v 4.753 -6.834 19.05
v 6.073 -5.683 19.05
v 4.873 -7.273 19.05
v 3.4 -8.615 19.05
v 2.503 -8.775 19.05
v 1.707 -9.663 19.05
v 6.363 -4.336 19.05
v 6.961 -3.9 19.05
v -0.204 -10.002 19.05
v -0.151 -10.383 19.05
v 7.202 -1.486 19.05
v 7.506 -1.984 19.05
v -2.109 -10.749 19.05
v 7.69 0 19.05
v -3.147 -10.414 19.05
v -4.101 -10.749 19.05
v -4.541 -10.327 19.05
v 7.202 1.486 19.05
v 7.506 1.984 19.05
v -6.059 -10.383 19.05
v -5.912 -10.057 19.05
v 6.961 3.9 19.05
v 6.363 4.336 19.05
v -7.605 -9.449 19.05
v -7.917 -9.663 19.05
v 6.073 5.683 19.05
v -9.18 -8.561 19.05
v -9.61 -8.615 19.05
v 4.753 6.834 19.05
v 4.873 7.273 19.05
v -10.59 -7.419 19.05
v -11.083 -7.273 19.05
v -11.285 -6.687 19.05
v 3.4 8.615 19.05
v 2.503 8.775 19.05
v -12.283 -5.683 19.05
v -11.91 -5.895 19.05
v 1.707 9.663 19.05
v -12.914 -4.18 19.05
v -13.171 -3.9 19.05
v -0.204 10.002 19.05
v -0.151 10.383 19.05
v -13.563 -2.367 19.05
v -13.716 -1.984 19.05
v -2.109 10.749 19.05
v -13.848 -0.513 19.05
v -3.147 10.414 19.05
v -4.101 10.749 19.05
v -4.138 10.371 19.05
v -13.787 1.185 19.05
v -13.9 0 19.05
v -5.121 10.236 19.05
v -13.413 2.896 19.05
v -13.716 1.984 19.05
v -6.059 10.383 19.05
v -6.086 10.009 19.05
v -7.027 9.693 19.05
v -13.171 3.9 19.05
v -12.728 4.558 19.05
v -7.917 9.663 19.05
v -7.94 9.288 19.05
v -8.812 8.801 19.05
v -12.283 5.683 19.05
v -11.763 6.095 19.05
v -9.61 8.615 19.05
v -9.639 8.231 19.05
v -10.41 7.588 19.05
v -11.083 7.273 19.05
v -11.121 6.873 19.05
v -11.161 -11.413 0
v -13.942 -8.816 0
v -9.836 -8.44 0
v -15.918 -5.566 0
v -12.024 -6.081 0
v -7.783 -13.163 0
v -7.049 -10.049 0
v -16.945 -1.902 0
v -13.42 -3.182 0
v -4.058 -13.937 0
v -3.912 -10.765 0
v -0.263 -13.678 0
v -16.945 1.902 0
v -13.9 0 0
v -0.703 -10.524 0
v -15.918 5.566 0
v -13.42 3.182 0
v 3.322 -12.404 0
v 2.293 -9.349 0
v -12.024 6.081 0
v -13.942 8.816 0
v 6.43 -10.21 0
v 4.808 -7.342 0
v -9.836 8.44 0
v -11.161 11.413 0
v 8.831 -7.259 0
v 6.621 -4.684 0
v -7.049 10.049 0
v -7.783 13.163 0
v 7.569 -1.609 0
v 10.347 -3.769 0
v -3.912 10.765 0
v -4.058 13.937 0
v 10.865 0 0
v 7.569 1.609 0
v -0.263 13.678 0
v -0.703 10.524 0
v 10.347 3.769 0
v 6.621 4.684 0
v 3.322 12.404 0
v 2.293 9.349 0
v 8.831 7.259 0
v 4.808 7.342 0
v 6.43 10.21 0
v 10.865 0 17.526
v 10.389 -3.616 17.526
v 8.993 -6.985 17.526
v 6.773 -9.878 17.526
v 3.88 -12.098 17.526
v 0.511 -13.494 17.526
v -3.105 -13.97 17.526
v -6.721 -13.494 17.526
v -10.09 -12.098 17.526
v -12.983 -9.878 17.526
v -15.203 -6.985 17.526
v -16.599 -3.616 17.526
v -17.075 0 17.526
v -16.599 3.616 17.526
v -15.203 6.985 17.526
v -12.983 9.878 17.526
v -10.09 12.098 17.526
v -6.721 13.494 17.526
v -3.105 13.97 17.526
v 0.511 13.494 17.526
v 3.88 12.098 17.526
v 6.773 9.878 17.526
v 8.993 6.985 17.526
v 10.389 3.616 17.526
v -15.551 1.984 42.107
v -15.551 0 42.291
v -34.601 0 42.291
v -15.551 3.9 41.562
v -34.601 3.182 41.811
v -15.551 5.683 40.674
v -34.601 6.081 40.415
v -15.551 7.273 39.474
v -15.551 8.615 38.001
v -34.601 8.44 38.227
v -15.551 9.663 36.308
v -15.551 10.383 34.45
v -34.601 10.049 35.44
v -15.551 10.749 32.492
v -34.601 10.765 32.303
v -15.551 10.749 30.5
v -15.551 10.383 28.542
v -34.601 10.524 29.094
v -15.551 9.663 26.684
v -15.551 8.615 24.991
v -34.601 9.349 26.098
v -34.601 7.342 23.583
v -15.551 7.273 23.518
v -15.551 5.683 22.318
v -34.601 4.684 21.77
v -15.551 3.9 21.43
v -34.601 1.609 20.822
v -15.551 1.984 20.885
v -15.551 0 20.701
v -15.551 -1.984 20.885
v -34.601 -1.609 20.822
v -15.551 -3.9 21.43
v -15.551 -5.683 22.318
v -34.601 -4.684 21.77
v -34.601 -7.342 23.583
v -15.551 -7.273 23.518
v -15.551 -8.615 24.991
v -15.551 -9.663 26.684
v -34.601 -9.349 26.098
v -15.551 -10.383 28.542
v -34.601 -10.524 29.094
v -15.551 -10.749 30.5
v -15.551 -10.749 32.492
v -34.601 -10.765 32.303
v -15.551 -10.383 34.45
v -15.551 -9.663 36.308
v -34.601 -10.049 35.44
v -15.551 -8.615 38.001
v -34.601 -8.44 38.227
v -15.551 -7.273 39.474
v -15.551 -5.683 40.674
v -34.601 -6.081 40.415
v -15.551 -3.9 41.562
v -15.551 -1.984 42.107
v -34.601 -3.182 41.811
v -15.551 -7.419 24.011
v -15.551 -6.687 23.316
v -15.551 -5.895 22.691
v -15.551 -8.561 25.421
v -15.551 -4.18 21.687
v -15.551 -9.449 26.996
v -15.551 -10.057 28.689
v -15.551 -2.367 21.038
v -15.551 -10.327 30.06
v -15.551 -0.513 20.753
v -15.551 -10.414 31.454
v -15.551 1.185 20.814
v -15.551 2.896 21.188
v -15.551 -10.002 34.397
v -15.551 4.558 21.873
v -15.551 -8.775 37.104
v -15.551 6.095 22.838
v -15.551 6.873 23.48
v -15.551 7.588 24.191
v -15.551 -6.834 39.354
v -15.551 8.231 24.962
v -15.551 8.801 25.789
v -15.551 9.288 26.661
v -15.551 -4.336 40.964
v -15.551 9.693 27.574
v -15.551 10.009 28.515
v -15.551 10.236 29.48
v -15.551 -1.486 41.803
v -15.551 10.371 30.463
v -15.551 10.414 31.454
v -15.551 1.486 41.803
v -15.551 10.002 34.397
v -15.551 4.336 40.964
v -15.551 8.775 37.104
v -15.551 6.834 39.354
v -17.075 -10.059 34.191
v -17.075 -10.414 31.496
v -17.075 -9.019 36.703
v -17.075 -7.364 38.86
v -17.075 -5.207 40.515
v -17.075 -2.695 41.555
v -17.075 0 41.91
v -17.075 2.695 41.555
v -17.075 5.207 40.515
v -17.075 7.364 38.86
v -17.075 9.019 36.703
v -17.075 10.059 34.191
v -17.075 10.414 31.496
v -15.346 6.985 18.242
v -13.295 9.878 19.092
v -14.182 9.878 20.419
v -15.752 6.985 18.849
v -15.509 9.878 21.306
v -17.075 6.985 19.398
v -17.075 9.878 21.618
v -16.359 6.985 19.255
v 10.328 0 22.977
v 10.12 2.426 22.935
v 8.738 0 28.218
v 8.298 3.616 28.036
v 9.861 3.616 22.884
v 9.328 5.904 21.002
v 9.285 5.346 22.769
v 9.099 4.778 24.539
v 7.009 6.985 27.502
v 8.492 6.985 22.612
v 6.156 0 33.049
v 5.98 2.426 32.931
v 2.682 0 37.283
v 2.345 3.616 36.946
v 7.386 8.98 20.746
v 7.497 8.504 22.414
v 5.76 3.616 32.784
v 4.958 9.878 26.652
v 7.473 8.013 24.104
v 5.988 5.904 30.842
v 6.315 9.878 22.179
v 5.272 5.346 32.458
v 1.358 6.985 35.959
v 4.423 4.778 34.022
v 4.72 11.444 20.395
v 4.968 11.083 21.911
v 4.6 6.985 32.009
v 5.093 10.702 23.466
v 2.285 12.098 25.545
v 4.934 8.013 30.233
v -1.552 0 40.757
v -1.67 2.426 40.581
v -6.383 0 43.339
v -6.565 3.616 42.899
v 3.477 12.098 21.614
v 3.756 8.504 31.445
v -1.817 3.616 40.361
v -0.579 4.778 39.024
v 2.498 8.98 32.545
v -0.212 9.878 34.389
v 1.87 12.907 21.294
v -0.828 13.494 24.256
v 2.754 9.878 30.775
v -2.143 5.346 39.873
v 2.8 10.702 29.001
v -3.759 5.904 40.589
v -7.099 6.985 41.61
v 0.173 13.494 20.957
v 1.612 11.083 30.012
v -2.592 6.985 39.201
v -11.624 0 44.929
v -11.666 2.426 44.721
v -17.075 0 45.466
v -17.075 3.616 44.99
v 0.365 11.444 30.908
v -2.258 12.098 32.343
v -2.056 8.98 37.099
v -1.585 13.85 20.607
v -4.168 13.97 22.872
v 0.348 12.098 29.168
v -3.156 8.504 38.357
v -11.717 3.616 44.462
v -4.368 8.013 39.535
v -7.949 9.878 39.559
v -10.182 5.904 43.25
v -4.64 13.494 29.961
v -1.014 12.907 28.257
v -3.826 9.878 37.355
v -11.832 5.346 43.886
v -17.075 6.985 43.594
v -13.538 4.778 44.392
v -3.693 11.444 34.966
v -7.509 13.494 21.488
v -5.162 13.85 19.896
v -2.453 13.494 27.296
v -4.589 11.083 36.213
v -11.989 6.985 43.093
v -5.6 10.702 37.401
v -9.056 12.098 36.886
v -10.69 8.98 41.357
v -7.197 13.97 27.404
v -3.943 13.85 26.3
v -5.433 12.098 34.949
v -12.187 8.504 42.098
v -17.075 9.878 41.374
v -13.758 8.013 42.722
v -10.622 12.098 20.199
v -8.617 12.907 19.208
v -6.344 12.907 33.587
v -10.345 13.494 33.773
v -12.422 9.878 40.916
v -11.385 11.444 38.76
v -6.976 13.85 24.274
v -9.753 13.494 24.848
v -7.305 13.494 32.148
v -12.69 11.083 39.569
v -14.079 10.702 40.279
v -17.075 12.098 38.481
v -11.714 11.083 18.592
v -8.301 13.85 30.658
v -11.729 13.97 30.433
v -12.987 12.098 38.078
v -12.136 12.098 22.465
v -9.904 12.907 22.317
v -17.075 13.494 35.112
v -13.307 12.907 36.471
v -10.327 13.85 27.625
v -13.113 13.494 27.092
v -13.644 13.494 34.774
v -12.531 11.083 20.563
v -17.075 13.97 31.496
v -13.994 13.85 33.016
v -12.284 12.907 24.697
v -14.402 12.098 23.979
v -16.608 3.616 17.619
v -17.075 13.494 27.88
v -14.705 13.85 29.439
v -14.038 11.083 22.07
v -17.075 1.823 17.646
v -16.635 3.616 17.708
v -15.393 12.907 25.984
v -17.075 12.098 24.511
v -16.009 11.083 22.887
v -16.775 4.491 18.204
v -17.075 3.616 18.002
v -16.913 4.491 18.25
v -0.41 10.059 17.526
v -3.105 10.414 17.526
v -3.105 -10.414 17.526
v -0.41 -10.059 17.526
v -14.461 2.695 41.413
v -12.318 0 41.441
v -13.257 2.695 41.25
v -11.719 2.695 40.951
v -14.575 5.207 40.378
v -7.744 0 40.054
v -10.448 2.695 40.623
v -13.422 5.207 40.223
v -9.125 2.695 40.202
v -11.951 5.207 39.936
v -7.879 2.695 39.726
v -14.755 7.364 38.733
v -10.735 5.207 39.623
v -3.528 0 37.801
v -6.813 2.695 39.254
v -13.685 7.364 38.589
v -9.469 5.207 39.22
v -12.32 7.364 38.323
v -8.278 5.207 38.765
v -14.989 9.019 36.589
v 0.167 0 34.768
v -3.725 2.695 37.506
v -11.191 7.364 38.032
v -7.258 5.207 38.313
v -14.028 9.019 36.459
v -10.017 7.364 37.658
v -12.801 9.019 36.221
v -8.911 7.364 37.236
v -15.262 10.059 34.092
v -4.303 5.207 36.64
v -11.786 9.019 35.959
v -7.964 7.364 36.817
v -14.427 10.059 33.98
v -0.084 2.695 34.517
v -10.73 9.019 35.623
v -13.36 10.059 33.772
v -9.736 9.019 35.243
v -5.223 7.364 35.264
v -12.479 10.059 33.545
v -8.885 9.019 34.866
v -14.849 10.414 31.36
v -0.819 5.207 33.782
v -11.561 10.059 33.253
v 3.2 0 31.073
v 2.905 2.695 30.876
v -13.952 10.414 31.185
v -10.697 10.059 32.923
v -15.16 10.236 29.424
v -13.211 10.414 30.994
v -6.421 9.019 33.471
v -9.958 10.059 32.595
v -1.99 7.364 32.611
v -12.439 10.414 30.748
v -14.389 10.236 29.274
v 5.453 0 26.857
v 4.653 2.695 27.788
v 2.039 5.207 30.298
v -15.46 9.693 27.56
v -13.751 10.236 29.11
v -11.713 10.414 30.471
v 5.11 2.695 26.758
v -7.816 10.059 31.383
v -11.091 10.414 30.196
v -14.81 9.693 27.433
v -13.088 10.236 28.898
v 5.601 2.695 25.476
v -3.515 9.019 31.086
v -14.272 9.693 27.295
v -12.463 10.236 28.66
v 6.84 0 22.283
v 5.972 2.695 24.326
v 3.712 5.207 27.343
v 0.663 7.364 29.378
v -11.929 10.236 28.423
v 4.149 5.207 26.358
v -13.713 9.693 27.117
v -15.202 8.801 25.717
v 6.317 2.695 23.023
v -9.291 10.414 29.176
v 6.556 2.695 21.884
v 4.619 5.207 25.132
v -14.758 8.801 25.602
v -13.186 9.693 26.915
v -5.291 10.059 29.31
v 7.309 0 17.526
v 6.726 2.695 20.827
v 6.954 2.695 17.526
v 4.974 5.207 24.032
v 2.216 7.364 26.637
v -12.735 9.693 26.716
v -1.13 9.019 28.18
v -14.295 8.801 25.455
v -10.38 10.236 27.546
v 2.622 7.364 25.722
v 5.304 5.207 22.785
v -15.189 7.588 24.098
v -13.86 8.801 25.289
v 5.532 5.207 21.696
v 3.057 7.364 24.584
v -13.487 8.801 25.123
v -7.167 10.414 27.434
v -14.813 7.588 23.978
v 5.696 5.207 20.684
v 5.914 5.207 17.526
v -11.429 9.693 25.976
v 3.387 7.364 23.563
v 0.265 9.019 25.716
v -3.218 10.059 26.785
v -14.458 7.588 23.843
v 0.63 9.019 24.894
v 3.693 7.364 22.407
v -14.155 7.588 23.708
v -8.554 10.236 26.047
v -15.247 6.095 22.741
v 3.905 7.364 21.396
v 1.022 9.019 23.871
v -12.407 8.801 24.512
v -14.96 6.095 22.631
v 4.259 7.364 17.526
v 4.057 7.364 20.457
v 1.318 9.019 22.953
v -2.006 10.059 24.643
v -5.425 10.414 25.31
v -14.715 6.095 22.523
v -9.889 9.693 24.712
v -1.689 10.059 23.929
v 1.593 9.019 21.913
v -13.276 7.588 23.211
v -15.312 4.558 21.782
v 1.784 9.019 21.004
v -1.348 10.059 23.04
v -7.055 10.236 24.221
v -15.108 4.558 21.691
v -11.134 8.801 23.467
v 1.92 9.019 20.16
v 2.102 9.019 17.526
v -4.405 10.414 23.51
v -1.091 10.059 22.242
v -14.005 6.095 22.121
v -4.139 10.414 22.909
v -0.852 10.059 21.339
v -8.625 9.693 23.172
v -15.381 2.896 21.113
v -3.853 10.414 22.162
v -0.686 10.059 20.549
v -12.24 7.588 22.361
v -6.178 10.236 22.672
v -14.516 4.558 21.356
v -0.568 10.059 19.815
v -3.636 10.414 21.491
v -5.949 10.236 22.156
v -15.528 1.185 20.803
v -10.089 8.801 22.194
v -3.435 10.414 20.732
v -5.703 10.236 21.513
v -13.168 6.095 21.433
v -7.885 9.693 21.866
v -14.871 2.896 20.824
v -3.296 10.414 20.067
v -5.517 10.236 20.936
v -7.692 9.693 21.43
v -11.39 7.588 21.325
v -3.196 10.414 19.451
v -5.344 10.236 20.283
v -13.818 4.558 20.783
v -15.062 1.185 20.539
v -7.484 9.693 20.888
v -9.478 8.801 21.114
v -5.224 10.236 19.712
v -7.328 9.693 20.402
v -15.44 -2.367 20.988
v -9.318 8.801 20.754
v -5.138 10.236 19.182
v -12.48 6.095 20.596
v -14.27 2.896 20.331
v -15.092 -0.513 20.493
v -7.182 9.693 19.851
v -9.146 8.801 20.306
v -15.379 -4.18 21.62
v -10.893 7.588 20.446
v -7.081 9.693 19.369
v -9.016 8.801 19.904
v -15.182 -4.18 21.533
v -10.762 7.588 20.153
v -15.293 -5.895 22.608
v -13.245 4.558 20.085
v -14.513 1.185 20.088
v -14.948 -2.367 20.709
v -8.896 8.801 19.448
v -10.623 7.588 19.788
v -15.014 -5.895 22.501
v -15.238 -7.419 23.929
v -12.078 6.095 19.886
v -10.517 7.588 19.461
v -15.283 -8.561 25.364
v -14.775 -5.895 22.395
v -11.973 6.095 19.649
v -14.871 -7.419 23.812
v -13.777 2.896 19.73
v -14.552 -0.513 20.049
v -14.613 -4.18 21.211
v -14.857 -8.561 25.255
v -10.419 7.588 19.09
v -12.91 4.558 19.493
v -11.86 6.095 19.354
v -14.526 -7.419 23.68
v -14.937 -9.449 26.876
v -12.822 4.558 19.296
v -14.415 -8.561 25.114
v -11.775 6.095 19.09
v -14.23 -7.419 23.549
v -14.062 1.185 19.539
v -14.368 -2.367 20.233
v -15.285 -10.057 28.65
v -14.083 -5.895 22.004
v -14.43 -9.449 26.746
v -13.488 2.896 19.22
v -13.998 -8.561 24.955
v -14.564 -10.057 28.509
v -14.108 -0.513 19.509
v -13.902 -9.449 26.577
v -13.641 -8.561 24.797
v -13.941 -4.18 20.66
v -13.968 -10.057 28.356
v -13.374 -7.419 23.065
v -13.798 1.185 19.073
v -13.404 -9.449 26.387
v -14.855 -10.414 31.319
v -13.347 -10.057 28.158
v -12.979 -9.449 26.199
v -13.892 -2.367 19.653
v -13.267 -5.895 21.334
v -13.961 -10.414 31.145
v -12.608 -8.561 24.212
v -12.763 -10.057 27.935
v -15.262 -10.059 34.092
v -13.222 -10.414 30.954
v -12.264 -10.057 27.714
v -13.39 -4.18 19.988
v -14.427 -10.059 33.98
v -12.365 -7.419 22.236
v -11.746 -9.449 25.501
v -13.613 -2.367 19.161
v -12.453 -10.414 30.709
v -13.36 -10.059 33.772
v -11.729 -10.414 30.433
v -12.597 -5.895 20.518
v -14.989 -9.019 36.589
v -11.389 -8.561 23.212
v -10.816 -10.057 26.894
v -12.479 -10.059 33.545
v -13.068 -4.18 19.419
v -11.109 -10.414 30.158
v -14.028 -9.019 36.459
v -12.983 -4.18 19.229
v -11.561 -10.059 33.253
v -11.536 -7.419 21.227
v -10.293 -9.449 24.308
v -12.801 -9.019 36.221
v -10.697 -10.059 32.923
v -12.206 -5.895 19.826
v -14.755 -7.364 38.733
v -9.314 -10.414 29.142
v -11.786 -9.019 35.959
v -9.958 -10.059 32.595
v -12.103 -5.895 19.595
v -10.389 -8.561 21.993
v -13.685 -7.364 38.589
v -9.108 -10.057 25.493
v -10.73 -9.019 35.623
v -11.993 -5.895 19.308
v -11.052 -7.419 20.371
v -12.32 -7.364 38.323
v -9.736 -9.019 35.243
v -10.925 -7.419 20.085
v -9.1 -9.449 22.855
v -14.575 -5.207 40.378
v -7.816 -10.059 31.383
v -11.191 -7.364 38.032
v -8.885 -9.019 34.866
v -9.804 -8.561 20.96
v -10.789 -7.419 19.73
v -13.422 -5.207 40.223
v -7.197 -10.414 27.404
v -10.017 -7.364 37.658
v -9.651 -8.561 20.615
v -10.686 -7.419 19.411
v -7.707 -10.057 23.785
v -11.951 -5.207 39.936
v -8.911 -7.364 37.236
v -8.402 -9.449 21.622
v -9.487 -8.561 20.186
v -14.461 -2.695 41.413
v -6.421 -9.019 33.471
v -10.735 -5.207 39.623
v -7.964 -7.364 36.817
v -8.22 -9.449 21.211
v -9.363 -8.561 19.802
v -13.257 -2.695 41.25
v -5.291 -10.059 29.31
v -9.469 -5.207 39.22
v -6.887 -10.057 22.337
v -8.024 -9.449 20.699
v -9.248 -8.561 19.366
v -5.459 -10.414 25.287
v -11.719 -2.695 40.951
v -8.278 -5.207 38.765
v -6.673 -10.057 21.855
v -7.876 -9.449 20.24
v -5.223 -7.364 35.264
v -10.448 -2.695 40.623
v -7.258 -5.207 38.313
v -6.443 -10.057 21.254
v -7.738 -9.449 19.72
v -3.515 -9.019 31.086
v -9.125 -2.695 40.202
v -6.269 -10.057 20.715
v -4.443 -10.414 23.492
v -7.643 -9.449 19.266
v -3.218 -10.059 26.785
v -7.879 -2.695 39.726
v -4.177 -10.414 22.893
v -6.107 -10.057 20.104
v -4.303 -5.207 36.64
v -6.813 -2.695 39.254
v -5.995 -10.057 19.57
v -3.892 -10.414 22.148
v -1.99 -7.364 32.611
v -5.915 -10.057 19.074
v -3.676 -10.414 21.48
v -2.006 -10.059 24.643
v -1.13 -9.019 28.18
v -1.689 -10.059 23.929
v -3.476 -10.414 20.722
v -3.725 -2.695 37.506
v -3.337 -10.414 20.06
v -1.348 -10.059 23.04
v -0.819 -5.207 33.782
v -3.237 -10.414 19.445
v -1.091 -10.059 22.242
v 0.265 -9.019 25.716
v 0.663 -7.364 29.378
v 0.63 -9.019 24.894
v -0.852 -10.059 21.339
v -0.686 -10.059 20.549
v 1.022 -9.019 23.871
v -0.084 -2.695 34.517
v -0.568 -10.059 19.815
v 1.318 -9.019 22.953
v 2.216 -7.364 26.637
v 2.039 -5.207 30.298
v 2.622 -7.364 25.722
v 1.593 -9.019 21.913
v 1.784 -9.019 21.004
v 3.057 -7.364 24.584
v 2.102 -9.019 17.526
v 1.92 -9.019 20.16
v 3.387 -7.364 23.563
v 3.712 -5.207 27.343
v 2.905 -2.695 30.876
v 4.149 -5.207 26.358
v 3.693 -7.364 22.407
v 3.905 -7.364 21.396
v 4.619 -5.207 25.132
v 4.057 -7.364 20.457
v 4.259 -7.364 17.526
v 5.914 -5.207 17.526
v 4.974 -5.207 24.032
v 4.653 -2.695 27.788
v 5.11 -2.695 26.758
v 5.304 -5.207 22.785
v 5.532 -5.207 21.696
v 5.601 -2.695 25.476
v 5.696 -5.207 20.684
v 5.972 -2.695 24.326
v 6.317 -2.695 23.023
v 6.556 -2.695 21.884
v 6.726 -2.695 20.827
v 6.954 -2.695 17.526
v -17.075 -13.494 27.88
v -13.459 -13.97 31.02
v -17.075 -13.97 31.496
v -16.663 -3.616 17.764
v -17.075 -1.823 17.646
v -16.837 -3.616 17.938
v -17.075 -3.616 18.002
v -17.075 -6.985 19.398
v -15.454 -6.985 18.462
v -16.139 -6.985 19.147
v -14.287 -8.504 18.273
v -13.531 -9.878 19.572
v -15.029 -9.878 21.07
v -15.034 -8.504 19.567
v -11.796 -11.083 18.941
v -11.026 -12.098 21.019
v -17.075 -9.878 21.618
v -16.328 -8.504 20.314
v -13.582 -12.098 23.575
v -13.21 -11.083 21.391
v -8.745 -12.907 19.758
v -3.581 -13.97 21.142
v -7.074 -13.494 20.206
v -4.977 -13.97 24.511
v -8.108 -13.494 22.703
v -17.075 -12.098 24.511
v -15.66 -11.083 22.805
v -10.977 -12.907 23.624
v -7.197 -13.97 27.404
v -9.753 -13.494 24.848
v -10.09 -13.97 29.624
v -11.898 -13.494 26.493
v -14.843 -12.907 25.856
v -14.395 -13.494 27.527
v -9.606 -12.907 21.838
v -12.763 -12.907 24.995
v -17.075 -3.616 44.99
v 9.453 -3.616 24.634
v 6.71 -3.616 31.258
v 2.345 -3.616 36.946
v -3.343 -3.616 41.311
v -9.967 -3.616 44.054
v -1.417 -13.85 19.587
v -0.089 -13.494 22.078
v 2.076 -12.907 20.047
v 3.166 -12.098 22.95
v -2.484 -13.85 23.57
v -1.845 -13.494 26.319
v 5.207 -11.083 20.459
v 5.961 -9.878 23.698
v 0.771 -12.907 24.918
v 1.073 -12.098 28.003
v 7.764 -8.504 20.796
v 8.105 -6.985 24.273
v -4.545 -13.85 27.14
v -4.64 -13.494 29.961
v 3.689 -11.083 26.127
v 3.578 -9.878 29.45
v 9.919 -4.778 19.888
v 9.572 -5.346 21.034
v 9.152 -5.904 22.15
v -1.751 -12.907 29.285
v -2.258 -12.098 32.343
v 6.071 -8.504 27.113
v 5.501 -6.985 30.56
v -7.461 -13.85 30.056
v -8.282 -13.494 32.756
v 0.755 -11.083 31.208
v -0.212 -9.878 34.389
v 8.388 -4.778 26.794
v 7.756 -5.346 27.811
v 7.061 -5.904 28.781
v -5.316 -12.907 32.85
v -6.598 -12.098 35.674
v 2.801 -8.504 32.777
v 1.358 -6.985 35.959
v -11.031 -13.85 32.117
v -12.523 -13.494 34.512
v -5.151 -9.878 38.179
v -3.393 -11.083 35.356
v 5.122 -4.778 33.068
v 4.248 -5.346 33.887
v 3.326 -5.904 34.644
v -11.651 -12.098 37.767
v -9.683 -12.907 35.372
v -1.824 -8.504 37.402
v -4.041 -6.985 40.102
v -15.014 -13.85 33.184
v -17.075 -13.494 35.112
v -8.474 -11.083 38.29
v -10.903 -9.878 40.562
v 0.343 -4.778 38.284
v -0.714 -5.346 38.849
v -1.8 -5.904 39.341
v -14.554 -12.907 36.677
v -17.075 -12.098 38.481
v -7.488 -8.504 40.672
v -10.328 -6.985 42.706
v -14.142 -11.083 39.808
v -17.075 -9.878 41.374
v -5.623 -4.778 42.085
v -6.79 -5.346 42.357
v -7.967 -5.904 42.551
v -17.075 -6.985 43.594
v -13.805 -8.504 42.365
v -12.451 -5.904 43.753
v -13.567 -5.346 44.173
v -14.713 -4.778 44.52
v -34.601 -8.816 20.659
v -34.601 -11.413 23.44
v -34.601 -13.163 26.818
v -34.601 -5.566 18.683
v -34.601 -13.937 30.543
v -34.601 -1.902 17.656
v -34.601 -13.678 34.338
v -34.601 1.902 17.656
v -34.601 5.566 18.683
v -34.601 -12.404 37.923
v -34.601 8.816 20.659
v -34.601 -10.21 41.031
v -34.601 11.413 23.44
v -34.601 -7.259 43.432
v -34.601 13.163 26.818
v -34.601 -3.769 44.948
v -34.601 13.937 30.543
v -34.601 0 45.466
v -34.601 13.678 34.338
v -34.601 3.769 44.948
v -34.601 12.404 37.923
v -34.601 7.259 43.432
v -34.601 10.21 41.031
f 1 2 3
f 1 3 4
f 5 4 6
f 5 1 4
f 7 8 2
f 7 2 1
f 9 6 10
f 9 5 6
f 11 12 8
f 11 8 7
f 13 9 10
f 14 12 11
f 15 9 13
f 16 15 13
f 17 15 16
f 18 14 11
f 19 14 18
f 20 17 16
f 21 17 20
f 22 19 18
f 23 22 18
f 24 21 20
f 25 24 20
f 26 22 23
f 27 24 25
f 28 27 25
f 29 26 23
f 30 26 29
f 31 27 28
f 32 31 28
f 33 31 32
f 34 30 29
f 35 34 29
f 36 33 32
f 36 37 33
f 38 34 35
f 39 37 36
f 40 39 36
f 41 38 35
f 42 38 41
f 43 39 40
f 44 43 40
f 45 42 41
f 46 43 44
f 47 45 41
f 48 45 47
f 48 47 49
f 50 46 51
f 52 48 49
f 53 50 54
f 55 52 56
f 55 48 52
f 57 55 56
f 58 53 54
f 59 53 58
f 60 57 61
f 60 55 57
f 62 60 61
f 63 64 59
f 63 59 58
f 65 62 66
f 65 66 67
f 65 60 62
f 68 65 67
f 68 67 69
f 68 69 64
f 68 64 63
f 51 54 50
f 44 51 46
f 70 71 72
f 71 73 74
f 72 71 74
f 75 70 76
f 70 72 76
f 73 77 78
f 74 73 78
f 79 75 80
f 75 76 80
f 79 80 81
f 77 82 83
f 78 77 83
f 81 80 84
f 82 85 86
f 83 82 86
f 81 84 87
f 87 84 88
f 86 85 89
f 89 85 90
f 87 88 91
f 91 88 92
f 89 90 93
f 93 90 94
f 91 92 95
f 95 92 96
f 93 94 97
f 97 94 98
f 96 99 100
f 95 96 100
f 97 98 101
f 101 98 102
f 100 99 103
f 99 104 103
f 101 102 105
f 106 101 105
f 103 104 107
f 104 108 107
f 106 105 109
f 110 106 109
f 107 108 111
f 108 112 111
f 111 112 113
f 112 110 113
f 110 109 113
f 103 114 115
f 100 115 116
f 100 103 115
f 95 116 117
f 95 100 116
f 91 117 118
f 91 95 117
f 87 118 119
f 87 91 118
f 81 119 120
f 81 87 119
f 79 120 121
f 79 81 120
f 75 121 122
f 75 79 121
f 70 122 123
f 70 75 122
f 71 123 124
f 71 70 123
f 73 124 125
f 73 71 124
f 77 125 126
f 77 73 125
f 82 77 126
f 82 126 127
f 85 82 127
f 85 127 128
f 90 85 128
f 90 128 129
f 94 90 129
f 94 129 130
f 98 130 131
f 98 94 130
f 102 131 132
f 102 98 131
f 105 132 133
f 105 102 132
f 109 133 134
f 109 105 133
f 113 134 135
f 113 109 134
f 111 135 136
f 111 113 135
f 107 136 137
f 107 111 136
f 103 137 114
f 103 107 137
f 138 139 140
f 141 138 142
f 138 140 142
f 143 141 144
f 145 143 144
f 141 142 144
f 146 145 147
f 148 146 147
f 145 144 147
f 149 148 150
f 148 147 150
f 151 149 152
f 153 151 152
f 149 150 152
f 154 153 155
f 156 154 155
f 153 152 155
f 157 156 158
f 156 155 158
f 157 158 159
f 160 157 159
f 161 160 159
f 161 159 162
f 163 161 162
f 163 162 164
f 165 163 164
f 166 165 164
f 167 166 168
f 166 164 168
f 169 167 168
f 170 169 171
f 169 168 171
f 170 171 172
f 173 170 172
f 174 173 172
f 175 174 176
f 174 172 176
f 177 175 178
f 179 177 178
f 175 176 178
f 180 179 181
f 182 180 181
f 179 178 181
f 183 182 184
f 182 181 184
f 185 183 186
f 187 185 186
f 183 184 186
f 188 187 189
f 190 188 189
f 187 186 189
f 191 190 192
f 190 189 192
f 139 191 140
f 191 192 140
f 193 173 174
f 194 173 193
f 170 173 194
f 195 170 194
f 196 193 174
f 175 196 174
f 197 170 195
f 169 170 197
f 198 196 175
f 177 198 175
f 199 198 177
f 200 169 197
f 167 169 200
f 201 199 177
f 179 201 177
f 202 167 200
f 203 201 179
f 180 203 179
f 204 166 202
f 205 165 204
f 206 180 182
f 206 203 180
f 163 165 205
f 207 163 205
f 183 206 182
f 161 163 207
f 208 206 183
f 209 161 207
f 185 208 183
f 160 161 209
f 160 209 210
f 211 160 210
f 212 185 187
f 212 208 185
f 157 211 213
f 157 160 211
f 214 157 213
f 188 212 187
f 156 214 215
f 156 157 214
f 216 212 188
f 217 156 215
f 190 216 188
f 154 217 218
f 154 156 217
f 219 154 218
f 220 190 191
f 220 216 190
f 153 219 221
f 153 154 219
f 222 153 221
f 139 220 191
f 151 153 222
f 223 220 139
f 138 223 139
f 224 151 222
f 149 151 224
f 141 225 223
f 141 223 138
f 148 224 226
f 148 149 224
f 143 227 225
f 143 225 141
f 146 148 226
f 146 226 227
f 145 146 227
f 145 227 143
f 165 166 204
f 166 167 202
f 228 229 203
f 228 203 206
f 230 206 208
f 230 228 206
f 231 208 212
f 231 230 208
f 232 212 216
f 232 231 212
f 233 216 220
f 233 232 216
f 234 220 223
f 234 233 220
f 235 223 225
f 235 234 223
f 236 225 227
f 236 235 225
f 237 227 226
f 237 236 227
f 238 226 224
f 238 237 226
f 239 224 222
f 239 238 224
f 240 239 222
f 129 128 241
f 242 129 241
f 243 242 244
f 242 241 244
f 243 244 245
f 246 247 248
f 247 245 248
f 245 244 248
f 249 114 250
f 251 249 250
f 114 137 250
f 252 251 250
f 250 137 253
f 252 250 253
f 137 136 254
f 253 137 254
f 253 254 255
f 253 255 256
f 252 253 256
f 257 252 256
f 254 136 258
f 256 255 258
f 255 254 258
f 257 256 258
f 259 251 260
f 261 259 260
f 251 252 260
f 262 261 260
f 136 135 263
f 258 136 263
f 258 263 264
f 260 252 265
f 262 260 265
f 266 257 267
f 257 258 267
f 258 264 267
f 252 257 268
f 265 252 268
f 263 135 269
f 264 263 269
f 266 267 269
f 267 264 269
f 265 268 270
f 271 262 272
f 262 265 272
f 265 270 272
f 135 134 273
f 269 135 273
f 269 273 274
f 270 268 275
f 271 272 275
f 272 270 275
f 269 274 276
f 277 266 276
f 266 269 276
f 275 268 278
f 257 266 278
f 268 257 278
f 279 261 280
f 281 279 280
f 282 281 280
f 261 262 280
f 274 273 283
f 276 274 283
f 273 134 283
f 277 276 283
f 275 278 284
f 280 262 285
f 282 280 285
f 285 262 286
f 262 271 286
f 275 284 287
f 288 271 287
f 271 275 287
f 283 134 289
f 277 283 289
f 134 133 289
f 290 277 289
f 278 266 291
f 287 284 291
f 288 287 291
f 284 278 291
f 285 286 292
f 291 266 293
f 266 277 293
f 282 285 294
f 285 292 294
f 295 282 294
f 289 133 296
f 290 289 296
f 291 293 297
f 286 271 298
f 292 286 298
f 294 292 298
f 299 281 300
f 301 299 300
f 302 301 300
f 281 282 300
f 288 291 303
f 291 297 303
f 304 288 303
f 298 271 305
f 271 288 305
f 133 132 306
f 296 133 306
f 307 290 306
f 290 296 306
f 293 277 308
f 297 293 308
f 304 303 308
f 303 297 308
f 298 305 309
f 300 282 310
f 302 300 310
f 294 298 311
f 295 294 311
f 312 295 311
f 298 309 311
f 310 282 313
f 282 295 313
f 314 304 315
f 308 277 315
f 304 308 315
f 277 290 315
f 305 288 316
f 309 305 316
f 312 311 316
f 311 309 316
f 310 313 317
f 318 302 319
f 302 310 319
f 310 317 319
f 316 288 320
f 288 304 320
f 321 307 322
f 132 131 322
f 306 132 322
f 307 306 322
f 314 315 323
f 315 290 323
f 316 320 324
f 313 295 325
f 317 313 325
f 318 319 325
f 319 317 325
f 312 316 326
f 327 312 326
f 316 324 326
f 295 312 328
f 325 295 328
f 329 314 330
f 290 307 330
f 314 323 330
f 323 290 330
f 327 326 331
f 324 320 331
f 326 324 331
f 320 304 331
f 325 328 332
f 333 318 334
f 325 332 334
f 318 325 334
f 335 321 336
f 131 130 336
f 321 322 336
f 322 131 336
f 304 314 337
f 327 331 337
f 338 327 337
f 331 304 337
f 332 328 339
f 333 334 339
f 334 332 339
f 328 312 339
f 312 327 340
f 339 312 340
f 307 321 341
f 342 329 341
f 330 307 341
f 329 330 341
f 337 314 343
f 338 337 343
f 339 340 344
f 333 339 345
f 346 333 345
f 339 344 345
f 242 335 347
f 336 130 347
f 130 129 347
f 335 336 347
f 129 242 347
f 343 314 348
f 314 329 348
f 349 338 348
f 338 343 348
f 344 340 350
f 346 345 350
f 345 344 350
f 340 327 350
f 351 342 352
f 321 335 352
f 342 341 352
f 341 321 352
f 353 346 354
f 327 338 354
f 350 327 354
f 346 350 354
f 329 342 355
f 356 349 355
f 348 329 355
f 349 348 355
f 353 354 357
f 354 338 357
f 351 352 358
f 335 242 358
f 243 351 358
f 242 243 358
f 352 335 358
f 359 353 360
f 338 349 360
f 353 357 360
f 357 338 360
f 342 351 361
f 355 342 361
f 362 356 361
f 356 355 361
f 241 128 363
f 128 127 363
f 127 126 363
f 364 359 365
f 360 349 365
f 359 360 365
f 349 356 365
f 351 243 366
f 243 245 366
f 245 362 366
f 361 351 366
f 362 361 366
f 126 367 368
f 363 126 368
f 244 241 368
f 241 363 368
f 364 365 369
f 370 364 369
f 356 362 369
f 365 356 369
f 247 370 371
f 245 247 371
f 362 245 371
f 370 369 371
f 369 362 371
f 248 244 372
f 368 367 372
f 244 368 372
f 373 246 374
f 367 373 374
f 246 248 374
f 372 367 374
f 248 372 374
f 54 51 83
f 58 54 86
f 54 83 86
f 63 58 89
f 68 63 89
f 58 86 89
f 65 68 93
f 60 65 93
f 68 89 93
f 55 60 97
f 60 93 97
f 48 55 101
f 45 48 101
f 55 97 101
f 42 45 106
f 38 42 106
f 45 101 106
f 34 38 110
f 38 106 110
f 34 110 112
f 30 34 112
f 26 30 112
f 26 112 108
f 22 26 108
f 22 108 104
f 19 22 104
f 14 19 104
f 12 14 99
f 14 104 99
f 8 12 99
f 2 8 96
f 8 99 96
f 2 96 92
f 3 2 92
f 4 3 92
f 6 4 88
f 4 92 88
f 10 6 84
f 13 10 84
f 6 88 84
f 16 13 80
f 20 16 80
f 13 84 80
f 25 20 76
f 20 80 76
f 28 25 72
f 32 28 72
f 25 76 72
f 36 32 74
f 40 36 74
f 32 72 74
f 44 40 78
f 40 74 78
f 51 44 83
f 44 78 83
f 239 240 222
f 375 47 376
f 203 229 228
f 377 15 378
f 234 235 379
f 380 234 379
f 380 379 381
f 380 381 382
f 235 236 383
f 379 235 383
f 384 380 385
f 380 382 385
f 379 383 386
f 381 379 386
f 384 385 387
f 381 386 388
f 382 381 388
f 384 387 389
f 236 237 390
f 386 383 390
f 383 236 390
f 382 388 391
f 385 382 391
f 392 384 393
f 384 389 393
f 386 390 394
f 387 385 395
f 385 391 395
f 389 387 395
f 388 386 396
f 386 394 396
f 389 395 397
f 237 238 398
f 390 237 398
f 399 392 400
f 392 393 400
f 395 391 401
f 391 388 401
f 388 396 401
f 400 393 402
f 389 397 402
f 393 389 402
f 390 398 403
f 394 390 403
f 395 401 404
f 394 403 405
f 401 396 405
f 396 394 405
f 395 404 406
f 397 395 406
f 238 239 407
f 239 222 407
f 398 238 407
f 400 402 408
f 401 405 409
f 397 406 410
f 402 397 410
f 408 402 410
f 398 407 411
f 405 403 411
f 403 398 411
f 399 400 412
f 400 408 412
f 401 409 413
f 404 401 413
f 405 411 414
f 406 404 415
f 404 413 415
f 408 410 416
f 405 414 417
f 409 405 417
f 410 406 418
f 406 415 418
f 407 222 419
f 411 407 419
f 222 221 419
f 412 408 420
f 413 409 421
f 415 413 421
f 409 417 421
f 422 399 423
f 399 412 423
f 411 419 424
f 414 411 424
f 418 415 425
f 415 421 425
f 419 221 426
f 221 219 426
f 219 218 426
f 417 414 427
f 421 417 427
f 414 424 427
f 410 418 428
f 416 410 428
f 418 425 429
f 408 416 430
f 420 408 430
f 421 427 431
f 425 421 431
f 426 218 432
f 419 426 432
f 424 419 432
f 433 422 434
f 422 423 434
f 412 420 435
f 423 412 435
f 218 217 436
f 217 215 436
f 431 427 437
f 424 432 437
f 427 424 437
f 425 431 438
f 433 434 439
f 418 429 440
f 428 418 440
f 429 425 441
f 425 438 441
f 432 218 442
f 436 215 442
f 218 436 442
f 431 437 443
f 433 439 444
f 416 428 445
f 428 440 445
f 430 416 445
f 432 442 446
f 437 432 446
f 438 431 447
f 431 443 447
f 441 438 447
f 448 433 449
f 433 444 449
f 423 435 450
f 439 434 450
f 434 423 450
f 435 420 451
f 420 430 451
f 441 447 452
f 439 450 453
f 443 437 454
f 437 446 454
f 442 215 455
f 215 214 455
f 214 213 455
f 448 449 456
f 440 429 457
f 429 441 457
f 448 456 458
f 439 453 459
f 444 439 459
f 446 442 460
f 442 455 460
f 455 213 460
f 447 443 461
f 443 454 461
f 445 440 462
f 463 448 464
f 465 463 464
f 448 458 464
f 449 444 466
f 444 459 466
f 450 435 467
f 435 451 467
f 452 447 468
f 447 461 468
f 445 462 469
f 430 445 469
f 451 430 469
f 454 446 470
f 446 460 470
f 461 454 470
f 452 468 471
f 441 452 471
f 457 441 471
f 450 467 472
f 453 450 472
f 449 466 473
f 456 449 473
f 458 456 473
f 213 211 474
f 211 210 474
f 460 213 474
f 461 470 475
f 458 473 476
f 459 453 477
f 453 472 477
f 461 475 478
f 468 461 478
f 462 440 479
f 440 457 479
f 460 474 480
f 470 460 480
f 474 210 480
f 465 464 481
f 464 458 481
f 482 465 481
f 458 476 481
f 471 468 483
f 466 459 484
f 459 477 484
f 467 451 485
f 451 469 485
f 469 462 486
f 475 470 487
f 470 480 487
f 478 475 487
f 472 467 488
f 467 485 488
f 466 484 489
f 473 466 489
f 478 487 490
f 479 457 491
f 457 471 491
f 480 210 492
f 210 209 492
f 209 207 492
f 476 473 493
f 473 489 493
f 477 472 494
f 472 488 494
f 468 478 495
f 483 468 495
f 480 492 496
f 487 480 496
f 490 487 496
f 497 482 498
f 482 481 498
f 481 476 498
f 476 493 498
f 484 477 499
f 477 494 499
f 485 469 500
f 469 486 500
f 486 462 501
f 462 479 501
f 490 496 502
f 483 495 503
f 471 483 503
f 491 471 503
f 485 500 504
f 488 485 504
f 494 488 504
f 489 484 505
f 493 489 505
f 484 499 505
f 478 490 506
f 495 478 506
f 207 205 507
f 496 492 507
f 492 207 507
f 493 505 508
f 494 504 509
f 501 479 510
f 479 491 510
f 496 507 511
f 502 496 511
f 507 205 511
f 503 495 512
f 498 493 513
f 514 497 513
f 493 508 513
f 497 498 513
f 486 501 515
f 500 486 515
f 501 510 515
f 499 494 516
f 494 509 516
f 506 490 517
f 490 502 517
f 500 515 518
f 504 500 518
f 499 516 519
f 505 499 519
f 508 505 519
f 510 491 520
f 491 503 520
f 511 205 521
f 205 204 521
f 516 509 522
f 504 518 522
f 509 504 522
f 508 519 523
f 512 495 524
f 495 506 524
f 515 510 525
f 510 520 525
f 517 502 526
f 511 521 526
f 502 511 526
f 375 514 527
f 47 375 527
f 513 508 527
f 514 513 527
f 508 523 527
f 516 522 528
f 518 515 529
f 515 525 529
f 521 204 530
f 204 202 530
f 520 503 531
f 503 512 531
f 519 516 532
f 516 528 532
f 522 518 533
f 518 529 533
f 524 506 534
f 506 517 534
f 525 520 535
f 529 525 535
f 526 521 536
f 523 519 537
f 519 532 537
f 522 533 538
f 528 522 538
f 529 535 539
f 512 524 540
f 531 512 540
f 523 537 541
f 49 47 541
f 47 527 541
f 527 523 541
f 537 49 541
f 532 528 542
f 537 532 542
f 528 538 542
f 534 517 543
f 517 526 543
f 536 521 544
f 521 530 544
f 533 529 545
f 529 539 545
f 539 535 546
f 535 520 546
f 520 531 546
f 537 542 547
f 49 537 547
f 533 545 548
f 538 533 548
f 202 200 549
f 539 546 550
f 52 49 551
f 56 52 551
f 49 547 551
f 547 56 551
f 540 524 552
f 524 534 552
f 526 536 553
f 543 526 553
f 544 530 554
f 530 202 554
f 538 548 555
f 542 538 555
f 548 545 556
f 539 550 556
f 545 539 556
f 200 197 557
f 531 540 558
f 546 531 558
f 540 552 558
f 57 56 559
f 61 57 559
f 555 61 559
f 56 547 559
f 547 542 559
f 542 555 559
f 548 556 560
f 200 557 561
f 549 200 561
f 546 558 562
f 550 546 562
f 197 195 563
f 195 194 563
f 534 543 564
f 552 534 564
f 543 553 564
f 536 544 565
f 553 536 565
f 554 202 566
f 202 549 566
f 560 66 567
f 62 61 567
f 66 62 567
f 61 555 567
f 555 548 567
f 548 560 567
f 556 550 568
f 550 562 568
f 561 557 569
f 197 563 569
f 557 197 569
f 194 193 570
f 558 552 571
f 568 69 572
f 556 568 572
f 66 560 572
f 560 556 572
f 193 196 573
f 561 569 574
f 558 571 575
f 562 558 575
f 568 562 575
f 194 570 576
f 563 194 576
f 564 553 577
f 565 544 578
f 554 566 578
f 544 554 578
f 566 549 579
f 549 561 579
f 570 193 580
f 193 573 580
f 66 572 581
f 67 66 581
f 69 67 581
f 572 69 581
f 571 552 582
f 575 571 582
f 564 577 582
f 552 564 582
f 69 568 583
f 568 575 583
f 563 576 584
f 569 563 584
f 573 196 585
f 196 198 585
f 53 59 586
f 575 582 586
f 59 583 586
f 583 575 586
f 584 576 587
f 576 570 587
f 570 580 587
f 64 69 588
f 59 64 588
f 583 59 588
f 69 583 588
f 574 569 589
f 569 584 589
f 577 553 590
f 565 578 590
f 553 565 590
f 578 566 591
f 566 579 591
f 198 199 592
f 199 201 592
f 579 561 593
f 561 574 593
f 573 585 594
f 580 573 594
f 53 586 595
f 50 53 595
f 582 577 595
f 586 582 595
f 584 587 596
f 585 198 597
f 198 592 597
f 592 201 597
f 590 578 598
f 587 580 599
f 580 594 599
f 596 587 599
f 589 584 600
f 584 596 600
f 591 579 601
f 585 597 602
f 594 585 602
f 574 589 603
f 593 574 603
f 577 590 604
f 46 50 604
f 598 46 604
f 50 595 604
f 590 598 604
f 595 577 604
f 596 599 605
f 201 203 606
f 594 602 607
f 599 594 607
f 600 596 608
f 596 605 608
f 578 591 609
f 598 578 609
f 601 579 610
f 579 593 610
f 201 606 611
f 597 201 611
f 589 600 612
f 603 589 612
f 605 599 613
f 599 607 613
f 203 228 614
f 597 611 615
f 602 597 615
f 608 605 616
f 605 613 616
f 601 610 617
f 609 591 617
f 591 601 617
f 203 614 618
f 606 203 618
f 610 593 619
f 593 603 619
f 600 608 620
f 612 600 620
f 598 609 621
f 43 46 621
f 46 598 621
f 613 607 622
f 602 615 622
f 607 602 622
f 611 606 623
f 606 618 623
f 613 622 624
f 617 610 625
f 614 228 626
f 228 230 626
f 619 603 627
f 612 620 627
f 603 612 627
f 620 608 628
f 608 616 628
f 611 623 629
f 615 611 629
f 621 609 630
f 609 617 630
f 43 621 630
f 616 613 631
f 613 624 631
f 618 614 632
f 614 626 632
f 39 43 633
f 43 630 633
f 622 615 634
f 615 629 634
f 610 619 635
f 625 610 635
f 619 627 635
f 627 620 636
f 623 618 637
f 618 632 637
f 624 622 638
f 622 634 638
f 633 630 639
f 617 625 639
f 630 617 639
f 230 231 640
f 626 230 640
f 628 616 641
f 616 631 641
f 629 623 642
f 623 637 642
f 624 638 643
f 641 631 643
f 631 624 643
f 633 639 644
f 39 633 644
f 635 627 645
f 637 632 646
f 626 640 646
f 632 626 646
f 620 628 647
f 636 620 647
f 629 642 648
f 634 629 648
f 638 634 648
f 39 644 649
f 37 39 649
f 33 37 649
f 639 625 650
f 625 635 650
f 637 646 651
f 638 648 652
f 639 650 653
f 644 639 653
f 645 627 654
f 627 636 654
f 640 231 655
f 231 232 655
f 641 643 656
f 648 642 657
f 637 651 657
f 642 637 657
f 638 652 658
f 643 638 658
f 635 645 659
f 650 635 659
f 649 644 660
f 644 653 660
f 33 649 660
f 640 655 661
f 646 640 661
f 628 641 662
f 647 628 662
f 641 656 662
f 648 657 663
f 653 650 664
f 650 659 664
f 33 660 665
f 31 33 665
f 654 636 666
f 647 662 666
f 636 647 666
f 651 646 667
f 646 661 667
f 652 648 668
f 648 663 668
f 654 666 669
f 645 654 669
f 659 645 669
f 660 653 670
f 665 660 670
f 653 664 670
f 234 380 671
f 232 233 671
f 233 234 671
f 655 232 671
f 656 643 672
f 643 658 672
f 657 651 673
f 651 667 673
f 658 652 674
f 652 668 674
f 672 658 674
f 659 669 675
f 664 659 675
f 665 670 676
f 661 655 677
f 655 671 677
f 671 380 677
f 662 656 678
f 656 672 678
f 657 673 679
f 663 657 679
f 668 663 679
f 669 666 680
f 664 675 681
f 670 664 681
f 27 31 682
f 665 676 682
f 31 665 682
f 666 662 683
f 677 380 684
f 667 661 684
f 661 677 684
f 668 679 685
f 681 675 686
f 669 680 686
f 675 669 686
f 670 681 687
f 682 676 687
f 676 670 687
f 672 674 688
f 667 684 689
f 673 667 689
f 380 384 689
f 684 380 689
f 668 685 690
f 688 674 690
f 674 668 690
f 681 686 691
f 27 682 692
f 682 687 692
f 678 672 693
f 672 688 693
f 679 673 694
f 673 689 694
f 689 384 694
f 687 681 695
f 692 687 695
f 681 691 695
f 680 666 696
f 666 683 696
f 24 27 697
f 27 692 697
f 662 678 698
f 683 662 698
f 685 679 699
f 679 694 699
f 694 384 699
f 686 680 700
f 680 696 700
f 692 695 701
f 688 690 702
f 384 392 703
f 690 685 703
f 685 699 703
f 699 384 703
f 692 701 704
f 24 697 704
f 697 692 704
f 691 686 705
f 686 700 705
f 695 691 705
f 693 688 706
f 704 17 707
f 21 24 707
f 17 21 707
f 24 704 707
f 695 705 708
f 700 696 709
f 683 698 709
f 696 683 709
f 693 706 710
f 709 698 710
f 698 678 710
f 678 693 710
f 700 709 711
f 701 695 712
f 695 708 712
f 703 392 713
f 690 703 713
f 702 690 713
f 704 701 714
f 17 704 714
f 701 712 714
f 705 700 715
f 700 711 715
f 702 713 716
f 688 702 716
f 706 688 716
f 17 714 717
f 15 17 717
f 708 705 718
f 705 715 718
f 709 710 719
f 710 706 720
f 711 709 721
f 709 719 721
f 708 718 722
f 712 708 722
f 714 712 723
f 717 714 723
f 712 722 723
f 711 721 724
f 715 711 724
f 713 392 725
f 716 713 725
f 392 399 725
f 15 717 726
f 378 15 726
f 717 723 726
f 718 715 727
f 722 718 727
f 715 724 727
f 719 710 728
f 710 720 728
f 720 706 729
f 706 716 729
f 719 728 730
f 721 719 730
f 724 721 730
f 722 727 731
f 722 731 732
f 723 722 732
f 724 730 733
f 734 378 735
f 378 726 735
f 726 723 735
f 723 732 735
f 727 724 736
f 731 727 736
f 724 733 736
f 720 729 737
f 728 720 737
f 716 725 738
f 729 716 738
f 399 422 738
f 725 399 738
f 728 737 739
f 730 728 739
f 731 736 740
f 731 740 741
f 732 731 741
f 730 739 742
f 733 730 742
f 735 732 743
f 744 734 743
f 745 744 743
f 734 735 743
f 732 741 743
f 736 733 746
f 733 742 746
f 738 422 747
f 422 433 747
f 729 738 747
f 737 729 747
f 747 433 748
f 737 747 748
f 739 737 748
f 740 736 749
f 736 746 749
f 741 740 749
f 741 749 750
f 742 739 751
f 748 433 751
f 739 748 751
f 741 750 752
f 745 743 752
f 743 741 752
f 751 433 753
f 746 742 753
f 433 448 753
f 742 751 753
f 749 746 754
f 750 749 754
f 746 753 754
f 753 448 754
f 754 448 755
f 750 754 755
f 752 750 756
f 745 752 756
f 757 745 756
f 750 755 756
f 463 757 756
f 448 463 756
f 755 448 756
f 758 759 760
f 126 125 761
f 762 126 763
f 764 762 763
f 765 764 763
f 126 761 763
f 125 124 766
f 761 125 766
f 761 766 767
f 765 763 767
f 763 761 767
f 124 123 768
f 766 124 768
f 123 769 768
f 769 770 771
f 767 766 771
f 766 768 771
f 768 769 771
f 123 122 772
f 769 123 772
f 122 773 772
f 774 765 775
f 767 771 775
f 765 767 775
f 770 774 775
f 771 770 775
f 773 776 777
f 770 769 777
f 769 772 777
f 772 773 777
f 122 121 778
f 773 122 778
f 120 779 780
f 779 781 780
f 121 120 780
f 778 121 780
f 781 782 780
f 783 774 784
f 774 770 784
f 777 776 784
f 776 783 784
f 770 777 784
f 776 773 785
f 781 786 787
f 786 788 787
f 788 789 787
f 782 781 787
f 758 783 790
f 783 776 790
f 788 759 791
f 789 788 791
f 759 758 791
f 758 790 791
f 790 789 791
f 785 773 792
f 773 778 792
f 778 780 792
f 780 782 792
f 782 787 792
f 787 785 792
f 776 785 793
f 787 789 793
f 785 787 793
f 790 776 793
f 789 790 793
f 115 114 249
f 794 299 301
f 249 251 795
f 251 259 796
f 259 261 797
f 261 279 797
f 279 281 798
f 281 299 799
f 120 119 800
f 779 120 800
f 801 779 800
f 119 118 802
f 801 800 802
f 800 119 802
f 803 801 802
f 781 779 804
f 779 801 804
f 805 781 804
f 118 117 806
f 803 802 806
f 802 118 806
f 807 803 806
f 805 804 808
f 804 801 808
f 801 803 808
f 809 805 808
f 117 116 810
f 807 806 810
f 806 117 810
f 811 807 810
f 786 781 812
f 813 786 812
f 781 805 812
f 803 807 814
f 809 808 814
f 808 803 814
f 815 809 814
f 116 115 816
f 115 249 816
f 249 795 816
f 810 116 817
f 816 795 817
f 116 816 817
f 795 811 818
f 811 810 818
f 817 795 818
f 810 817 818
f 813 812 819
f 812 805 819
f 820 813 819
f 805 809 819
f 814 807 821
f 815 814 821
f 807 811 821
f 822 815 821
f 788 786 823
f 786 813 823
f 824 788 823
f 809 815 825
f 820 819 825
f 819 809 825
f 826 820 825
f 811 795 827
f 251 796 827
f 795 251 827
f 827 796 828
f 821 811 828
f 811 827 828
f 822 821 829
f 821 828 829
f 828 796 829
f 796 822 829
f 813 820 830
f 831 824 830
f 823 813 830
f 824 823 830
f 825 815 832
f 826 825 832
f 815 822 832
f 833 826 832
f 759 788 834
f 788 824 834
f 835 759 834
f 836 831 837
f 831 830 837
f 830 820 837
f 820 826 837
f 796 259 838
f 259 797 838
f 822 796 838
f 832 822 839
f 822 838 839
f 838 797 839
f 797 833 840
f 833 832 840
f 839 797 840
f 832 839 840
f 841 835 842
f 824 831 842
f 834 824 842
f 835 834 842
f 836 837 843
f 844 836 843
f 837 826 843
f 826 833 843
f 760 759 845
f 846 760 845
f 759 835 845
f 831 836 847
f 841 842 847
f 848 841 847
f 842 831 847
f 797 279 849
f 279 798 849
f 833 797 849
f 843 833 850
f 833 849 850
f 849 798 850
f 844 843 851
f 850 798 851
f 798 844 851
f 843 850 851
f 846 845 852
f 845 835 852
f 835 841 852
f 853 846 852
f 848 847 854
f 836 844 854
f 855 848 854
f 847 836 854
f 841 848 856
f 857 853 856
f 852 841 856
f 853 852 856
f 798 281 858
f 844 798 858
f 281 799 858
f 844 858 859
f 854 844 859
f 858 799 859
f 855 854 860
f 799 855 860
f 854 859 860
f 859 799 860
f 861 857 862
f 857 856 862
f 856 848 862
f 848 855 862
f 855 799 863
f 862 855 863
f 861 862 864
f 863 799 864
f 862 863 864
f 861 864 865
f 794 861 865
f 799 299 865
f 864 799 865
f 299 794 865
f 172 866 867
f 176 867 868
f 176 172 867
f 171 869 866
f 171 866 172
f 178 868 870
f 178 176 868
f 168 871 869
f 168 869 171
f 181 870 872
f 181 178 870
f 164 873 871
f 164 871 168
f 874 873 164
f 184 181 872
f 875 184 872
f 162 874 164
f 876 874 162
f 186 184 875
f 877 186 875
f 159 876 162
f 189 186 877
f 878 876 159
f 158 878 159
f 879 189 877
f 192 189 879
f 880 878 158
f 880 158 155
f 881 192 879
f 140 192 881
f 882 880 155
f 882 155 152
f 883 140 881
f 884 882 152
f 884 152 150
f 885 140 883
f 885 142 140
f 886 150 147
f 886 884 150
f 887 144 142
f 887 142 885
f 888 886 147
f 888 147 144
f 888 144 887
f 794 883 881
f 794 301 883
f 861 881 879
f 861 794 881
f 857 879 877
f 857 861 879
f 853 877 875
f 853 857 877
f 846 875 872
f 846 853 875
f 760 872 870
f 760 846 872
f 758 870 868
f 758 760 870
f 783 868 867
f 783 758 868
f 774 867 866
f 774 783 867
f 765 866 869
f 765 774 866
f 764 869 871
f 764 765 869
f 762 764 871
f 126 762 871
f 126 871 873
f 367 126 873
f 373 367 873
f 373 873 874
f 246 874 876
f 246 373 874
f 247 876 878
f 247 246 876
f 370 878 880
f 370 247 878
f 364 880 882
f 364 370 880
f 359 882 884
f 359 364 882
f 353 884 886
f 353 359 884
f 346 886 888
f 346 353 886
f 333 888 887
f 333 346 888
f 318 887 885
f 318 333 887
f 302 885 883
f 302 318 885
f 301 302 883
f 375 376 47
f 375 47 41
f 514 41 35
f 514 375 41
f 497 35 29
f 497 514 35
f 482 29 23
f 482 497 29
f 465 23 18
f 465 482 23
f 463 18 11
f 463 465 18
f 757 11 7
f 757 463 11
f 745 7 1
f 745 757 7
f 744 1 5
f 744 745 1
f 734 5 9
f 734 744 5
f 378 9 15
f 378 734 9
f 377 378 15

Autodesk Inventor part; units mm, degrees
ref_plane "YZ Plane" through (0, 0, 0) normal (1, 0, 0) x (0, 1, 0)
ref_plane "XZ Plane" through (0, 0, 0) normal (0, 1, 0) x (-1, 0, 0)
ref_plane "XY Plane" through (0, 0, 0) normal (0, 0, 1) x (1, 0, 0)
sketch "Sketch1" plane through (0, 0, 0) normal (0, 0, 1) x (1, 0, 0)
  circle A0 centre (-3.105, 0) radius 13.97
  circle A1 centre (-3.105, 0) radius 10.414
  point P0 (0, 0)
  dimension "d0" = 27.94
  dimension "d2" = 20.828
extrude "Extrusion1" add sketch "Sketch1" along normal blind 17.526
sketch "Sketch2" plane through (-3.105, 0, 17.526) normal (0, 0, 1) x (1, 0, 0)
  circle A0 centre (0, 0) radius 10.414 projected
  circle A1 centre (0, 0) radius 13.97 projected
  line L0 (-13.97, 13.97) -> (-13.97, -13.97)
  line L1 (-13.97, -13.97) -> (13.97, -13.97)
  point P0 (3.105, 0)
revolve "Revolution1" add sketch "Sketch2" angle 90 about axis through (-17.075, 13.97, 17.526) along (0, -1, 0) contours A1
sketch "Sketch3" plane through (-17.075, 0, 31.496) normal (-1, 0, 0) x (0, 0, 1)
  circle A0 centre (0, 0) radius 10.414 projected
  circle A1 centre (0, 0) radius 13.97 projected
  point P0 (-13.97, 0)
  point P1 (-31.496, 0)
extrude "Extrusion2" add sketch "Sketch3" along normal blind 17.526
sketch "Sketch4" plane through (-34.601, 0, 31.496) normal (-1, 0, 0) x (0, 0, 1)
  circle A0 centre (0, 0) radius 10.414 projected
  circle A1 centre (0, 0) radius 13.97 projected
  circle A2 centre (0, 0) radius 10.795
  point P0 (-31.496, 0)
  dimension "d8" = 21.59
extrude "Extrusion3" cut sketch "Sketch4" against normal blind 19.05 contours A2
sketch "Sketch5" plane through (-3.105, 0, 0) normal (0, 0, -1) x (-1, 0, 0)
  circle A0 centre (0, 0) radius 10.414 projected
  circle A1 centre (0, 0) radius 13.97 projected
  circle A2 centre (0, 0) radius 10.795
  point P0 (-3.105, 0)
  dimension "d12" = 21.59
extrude "Extrusion4" cut sketch "Sketch5" against normal blind 19.05 contours A2
properties part number "0.5 Elbow" material "PVC-Piping"
